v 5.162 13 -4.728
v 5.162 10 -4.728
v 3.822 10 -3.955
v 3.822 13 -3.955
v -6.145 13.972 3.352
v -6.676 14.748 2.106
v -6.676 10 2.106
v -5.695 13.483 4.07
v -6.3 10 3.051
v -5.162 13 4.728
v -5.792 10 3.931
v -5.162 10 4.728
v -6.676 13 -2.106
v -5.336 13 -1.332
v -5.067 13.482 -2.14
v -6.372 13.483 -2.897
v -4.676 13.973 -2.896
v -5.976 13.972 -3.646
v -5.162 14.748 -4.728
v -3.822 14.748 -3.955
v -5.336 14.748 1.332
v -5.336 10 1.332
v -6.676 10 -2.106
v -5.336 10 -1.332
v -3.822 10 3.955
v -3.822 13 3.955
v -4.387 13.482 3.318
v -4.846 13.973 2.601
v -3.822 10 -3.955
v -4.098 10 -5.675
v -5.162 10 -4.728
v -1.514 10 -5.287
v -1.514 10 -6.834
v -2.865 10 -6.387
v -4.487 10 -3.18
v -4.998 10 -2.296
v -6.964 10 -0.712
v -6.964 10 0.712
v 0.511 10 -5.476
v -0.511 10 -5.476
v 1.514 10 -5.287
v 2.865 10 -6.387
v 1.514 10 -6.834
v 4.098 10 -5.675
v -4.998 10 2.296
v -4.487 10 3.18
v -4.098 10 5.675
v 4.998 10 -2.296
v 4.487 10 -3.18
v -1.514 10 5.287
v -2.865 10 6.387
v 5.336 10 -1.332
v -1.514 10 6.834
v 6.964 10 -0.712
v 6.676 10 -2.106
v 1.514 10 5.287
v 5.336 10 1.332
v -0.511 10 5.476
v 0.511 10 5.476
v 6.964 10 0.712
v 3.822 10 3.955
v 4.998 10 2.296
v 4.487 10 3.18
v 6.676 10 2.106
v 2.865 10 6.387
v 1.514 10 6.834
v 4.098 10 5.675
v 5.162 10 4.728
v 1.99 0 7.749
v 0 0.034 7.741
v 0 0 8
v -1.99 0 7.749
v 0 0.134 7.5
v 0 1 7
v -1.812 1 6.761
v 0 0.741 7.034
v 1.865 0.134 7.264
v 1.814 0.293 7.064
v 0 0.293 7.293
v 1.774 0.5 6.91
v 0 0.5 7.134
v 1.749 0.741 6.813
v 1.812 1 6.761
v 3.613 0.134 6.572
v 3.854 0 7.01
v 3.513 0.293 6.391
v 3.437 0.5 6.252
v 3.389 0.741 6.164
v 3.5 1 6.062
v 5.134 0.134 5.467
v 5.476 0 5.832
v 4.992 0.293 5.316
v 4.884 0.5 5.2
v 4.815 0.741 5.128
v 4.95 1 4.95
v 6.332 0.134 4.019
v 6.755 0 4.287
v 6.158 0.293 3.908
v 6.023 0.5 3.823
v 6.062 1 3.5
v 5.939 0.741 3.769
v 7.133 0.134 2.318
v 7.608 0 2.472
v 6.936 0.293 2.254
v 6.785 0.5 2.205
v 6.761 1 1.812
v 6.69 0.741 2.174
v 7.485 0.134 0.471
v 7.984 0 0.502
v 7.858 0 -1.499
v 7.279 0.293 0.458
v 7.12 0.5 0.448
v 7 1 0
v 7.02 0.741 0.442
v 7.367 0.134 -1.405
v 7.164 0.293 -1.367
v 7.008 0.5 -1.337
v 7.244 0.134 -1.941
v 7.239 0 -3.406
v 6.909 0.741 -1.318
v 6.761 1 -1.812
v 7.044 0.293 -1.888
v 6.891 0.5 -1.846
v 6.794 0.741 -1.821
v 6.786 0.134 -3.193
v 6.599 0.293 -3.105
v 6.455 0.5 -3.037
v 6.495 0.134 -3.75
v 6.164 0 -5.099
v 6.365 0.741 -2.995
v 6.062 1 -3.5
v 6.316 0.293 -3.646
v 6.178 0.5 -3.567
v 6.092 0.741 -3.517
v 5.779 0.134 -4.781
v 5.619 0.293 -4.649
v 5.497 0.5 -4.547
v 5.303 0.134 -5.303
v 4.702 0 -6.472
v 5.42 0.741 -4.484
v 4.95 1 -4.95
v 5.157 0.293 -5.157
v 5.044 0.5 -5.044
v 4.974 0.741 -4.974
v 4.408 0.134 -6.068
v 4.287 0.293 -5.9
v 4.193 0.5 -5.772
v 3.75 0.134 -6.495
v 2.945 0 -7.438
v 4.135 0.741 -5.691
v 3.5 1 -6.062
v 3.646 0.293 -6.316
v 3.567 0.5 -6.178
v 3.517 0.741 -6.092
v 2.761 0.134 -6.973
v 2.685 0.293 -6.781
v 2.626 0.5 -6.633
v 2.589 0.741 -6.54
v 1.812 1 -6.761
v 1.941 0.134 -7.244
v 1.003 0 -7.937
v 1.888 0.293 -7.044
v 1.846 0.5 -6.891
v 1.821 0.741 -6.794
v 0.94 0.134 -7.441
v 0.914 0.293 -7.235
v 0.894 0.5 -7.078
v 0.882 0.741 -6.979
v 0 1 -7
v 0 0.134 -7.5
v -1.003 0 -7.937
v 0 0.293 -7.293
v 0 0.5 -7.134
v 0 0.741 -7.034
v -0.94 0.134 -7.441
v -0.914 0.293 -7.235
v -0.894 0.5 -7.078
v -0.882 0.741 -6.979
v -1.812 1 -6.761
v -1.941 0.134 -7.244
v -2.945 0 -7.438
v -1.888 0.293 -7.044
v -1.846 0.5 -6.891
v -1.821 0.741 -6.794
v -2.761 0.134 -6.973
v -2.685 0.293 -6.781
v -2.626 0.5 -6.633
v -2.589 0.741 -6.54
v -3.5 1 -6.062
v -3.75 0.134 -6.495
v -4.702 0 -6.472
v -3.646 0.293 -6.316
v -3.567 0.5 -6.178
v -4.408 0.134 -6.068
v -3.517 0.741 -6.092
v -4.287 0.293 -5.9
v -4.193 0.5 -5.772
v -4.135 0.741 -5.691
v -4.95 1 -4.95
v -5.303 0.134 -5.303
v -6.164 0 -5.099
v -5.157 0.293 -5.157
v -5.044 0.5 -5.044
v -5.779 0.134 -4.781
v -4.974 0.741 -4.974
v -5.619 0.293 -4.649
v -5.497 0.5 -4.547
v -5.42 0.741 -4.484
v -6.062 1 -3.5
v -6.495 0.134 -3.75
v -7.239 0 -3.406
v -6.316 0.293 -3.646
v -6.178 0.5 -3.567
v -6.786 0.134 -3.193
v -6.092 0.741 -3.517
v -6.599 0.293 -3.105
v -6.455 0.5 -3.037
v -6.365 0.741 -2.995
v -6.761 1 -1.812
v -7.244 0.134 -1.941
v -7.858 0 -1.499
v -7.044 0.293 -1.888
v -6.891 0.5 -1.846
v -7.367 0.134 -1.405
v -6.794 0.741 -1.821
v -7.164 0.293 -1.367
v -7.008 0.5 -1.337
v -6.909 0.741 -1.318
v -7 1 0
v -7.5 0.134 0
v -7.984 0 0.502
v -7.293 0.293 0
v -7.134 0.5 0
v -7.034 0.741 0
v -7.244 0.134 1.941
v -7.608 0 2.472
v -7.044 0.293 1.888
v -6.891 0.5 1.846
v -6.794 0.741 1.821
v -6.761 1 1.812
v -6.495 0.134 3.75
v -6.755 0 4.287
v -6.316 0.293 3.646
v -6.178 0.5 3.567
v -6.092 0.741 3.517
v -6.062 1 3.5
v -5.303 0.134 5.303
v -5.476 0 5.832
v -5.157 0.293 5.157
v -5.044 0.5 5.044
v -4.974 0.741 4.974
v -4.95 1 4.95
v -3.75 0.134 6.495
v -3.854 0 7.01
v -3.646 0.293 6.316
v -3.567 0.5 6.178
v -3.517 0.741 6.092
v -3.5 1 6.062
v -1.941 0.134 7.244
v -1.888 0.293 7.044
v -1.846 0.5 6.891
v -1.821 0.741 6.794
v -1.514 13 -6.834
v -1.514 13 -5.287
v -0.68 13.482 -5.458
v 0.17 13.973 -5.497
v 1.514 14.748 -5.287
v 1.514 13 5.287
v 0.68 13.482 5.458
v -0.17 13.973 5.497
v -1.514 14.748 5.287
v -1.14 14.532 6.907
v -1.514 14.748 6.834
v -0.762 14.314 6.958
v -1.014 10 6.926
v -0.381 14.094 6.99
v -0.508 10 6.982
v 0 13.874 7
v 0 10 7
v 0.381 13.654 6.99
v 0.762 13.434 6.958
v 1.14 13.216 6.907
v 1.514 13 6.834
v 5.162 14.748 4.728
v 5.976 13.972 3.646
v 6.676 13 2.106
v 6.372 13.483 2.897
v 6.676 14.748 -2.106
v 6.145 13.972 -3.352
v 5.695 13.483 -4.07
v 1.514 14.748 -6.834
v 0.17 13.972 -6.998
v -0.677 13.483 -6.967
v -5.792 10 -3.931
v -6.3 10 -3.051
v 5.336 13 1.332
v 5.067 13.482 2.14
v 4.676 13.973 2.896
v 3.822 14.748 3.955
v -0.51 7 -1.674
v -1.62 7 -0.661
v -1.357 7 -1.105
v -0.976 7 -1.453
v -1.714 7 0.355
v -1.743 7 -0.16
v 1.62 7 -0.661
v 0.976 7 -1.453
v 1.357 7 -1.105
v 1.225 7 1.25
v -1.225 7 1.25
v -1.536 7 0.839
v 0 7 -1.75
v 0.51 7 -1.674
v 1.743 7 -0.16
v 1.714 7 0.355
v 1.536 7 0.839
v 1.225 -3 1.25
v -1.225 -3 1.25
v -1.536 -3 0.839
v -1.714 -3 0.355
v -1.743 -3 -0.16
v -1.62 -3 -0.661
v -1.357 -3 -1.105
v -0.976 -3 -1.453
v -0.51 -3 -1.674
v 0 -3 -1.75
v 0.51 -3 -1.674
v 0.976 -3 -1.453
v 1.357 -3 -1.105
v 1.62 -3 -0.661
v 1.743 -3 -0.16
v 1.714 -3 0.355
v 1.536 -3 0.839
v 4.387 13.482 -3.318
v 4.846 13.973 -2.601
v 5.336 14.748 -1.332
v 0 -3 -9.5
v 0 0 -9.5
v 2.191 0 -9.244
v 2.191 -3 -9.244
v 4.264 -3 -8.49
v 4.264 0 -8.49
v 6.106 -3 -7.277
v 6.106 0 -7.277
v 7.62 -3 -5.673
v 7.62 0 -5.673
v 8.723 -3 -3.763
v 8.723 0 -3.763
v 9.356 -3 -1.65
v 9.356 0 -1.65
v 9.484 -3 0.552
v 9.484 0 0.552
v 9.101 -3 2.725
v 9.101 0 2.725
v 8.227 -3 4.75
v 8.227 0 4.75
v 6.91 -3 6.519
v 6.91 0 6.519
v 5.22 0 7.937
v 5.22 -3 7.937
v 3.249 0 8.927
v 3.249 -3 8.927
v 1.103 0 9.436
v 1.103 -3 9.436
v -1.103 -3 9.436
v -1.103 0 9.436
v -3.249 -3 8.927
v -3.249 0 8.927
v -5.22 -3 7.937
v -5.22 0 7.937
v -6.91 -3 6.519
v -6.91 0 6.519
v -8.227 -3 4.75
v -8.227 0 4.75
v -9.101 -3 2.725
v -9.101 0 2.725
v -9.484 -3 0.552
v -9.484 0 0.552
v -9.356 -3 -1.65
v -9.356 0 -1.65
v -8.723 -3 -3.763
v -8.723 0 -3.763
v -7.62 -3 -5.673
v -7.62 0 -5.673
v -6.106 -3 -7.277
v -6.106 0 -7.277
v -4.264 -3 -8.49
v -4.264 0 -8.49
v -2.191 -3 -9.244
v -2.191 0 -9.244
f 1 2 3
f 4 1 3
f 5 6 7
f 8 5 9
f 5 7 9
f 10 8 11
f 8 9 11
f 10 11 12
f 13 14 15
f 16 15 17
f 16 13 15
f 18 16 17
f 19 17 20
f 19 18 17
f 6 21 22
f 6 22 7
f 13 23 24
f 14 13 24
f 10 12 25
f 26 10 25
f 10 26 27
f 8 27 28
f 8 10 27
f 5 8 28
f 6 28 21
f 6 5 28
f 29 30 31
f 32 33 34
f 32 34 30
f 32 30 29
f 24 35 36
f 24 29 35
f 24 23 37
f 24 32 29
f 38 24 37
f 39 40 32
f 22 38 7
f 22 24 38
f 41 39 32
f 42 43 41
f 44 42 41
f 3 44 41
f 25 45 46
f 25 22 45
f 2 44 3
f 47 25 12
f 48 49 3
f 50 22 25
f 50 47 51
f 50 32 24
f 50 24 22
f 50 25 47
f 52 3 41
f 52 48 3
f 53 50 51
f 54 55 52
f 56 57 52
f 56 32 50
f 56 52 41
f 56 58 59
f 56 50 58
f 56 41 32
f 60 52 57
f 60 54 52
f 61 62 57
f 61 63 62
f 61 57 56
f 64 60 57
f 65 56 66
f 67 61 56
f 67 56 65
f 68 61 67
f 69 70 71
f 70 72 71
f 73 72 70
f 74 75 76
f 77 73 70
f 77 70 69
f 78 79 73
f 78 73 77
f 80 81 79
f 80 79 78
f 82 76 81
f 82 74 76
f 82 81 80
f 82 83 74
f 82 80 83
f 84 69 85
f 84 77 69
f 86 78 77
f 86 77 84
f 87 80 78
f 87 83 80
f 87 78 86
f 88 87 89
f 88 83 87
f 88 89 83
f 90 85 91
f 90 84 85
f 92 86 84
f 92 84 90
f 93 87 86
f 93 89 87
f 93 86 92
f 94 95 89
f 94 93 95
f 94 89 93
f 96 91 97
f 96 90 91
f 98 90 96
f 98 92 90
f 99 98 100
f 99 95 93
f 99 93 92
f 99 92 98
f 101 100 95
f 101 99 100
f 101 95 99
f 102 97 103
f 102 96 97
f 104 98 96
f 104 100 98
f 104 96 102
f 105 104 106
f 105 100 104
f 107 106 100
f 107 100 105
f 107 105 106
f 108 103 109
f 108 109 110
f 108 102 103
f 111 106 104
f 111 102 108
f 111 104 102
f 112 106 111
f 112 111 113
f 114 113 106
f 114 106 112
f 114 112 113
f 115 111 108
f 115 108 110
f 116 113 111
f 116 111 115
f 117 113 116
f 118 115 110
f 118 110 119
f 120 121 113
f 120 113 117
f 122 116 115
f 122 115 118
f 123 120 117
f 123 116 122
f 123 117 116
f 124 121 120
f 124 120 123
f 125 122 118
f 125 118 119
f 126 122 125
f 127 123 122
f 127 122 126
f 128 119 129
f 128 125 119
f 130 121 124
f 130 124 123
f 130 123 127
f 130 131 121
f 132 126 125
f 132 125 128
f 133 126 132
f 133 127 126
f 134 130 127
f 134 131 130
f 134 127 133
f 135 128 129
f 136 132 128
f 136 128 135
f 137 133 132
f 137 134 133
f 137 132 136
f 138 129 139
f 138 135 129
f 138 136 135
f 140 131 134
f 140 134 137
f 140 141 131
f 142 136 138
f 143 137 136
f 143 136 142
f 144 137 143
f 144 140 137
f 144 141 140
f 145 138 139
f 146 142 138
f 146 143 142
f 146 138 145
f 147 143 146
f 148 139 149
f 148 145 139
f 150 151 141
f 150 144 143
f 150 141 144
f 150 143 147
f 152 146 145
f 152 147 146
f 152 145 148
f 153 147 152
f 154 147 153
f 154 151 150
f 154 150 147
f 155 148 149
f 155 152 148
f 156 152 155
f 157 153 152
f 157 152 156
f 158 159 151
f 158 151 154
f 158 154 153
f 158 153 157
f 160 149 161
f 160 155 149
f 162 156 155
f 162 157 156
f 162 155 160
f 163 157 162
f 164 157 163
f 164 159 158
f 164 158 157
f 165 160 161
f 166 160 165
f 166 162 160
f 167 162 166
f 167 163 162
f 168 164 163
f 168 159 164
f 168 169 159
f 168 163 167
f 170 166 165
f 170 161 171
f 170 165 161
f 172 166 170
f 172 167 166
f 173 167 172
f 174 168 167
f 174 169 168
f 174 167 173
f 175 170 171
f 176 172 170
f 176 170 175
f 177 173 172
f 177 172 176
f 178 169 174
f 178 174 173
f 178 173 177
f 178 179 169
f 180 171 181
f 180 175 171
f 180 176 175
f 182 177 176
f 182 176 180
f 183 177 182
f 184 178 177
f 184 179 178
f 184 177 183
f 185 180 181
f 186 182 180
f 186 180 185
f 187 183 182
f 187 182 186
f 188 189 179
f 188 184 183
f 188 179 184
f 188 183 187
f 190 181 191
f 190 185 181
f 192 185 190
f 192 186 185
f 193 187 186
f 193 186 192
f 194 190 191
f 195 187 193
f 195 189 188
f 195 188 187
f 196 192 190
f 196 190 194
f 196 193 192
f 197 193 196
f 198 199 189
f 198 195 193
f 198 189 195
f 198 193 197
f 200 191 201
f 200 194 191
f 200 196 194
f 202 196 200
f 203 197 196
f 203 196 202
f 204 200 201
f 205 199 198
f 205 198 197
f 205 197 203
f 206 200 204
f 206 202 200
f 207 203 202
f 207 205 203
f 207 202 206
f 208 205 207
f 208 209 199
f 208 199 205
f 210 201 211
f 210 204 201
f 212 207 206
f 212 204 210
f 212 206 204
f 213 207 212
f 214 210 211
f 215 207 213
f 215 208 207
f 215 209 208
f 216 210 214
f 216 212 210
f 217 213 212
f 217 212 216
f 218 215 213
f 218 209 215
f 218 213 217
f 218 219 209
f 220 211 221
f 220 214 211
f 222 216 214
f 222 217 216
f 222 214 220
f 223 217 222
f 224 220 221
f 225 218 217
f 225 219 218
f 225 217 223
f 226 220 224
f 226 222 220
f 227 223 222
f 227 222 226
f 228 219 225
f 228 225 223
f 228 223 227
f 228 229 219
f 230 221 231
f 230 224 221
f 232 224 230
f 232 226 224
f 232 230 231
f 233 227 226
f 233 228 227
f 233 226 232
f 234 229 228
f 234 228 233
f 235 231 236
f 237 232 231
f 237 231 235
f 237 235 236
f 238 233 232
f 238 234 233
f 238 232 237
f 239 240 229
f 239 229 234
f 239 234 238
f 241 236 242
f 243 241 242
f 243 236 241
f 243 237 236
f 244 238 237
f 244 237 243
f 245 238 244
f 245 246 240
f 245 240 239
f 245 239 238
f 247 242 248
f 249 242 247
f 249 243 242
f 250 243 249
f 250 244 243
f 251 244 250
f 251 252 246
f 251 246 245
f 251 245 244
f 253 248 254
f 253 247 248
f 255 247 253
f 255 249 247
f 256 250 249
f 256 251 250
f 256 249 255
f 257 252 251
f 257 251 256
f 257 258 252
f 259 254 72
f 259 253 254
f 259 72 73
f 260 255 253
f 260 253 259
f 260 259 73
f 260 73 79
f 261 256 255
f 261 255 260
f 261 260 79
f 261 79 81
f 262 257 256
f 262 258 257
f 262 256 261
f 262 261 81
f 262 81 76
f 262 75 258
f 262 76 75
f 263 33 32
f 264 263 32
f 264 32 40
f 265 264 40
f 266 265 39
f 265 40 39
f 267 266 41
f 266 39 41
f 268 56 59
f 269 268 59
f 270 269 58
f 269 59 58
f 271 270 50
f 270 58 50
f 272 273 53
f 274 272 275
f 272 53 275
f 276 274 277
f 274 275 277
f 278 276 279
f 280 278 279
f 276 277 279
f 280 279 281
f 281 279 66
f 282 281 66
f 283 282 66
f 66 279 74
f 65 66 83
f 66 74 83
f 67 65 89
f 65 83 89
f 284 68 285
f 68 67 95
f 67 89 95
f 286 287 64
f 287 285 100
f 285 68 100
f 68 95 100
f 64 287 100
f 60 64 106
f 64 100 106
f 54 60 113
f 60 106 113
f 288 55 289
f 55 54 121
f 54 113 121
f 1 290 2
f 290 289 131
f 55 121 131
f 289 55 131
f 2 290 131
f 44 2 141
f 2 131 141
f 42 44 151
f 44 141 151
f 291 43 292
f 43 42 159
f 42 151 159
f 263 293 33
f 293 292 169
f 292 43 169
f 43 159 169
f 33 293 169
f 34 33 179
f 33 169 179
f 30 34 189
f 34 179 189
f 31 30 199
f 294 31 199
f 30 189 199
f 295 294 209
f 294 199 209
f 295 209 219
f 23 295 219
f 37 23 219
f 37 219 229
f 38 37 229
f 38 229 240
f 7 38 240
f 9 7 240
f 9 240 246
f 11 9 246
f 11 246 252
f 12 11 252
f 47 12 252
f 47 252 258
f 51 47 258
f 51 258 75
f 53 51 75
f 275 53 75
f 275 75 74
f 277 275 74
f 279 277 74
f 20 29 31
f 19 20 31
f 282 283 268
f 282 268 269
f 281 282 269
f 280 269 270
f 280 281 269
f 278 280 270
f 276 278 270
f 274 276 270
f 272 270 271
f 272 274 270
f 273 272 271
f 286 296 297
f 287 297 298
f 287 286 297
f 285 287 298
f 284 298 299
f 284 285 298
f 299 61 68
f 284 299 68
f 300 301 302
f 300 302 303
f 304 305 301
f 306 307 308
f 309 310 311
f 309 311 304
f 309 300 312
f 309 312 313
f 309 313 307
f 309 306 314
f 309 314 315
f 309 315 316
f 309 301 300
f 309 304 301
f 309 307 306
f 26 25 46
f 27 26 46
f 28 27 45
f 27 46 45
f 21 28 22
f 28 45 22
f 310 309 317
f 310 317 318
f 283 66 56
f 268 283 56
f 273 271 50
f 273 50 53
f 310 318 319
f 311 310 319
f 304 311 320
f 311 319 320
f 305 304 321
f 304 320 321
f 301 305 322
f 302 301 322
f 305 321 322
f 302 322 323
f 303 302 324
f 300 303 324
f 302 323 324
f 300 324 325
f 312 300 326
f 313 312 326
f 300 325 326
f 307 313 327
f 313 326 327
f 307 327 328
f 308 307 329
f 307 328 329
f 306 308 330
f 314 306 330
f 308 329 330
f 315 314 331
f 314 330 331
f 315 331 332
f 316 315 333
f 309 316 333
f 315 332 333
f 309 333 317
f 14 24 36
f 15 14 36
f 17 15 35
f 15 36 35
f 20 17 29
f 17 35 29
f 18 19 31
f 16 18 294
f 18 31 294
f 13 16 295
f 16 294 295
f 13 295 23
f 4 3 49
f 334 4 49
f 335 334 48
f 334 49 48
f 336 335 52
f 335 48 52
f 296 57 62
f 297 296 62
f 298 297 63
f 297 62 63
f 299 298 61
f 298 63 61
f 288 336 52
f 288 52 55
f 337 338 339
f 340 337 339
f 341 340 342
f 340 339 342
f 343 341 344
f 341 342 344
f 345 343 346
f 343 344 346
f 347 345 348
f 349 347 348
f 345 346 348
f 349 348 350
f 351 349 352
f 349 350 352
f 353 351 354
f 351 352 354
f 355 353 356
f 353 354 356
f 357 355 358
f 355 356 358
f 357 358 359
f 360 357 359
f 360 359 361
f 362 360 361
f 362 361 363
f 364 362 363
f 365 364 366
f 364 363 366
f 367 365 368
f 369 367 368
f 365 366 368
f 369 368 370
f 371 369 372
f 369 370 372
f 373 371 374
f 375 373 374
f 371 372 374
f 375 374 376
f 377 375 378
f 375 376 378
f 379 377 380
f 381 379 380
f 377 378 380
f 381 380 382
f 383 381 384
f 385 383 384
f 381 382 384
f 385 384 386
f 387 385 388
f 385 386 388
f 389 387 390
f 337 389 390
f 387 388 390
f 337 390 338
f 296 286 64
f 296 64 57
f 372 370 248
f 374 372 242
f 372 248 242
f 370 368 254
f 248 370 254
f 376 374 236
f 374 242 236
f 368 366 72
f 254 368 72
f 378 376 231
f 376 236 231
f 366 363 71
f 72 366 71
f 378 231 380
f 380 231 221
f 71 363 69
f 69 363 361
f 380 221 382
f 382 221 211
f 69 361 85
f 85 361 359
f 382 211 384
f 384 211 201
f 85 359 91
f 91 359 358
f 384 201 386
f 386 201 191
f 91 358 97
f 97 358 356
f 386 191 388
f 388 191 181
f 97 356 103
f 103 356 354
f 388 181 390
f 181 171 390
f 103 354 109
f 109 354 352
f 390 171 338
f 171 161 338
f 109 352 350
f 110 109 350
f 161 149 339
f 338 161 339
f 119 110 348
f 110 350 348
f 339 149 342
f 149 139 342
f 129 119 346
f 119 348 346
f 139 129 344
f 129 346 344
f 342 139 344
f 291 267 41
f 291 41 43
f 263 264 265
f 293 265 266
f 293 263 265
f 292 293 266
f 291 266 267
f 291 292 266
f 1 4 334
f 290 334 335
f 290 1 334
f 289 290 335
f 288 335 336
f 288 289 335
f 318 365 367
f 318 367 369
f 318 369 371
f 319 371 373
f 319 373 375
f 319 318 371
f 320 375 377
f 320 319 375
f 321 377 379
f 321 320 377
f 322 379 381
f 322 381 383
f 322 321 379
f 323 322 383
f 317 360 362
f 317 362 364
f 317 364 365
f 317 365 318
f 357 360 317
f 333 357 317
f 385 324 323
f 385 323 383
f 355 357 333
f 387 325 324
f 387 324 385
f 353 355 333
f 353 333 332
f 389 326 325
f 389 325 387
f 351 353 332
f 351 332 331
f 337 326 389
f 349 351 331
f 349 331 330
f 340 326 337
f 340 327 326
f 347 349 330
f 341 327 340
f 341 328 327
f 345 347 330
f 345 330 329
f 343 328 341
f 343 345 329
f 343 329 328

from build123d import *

# Parameters (mm, degrees)
SKETCH1_R           = 7
BOSS_EXTRUDE1_DEPTH = 10
BOSS_EXTRUDE3_DEPTH = 5
CHAMFER2_SIZE       = 2
CHAMFER2_SIZE_2     = 3.464101615
SKETCH7_R           = 9.5
BOSS_EXTRUDE4_DEPTH = 3
CUT_EXTRUDE1_DEPTH  = 10
FILLET1_R           = 1


with BuildPart() as part:
    # Sketch1 → Boss-Extrude1 (new body)
    with BuildSketch(Plane(origin=(0, 0, 0), x_dir=(1, 0, 0), z_dir=(0, 1, 0))):
        with Locations(Location((0, 0, 0), (0, 0, 270))):
            Circle(SKETCH1_R)
    extrude(amount=BOSS_EXTRUDE1_DEPTH)

    # Sketch5 → Boss-Extrude3 (add)
    with BuildSketch(Plane(origin=(0, 10, 0), x_dir=(1, 0, 0), z_dir=(0, 1, 0))):
        with BuildLine():
            Line((-3.821979409, 3.955056687), (-5.161555406, 4.72846125))
            ThreePointArc((-5.161555406, 4.72846125), (-6.062177826, 3.5), (-6.675745266, 2.10580748))
            Line((-6.675745266, 2.10580748), (-5.336169269, 1.332402917))
            ThreePointArc((-5.336169269, 1.332402917), (-4.763139721, 2.75), (-3.821979409, 3.955056687))
        make_face()
        with BuildLine():
            Line((1.51418986, 5.287459604), (1.51418986, 6.83426873))
            ThreePointArc((1.51418986, 6.83426873), (0, 7), (-1.51418986, 6.83426873))
            Line((-1.51418986, 6.83426873), (-1.51418986, 5.287459604))
            ThreePointArc((-1.51418986, 5.287459604), (0, 5.5), (1.51418986, 5.287459604))
        make_face()
        with BuildLine():
            ThreePointArc((6.675745266, 2.10580748), (6.062177826, 3.5), (5.161555406, 4.72846125))
            Line((5.161555406, 4.72846125), (3.821979409, 3.955056687))
            ThreePointArc((3.821979409, 3.955056687), (4.763139721, 2.75), (5.336169269, 1.332402917))
            Line((5.336169269, 1.332402917), (6.675745266, 2.10580748))
        make_face()
        with BuildLine():
            ThreePointArc((5.161555406, -4.72846125), (6.062177826, -3.5), (6.675745266, -2.10580748))
            Line((6.675745266, -2.10580748), (5.336169269, -1.332402917))
            ThreePointArc((5.336169269, -1.332402917), (4.763139721, -2.75), (3.821979409, -3.955056687))
            Line((3.821979409, -3.955056687), (5.161555406, -4.72846125))
        make_face()
        with BuildLine():
            ThreePointArc((-1.51418986, -6.83426873), (0, -7), (1.51418986, -6.83426873))
            Line((1.51418986, -6.83426873), (1.51418986, -5.287459604))
            ThreePointArc((1.51418986, -5.287459604), (0, -5.5), (-1.51418986, -5.287459604))
            Line((-1.51418986, -5.287459604), (-1.51418986, -6.83426873))
        make_face()
        with BuildLine():
            Line((-5.336169269, -1.332402917), (-6.675745266, -2.10580748))
            ThreePointArc((-6.675745266, -2.10580748), (-6.062177826, -3.5), (-5.161555406, -4.72846125))
            Line((-5.161555406, -4.72846125), (-3.821979409, -3.955056687))
            ThreePointArc((-3.821979409, -3.955056687), (-4.763139721, -2.75), (-5.336169269, -1.332402917))
        make_face()
    extrude(amount=BOSS_EXTRUDE3_DEPTH)

    # Chamfer2
    # the kernel refuses this chamfer: 3.464101615, 2 mm, written as the material it takes off along each edge
    with BuildSketch(Plane(origin=(-1.51418986, 15, -15.796196671), x_dir=(-0.05789386240267136, -0.9983227437537926, 0), z_dir=(0, 0, 1)), Plane(origin=(12.92281267, 15, -9.20942522), x_dir=(-0.02894693120133557, -0.9983227437537926, -0.05013755556391421), z_dir=(-0.8660254037844396, 0, 0.4999999999999985)), Plane(origin=(14.43700253, 15, 6.58677145), x_dir=(0.02894693120133555, -0.9983227437537926, -0.05013755556391386), z_dir=(-0.8660254037844383, 0, -0.5000000000000009)), Plane(origin=(1.51418986, 15, 15.796196671), x_dir=(0.05789386240267136, -0.9983227437537926, 0), z_dir=(0, 0, -1)), Plane(origin=(-12.92281267, 15, 9.20942522), x_dir=(0.028946931201335627, -0.9983227437537926, 0.05013755556391417), z_dir=(0.866025403784439, 0, -0.4999999999999995)), Plane(origin=(-14.43700253, 15, -6.58677145), x_dir=(-0.028946931201335666, -0.9983227437537926, 0.05013755556391416), z_dir=(0.8660254037844386, 0, 0.5000000000000002))) as chamfer2_piece_1:
        Polygon((CHAMFER2_SIZE * 0.998322743754, CHAMFER2_SIZE * 0.0578938624027), (-CHAMFER2_SIZE_2 * 0.057893862405, CHAMFER2_SIZE_2 * 0.998322743793), (0, 0), align=None)
    extrude(amount=19.470665008, mode=Mode.SUBTRACT)

    # Sketch7 → Boss-Extrude4 (add)
    with BuildSketch(Plane.XZ):
        with Locations(Location((0, 0, 0), (0, 0, 270))):
            Circle(SKETCH7_R)
    extrude(amount=BOSS_EXTRUDE4_DEPTH)

    # Sketch6 → Cut-Extrude1 (cut)
    with BuildSketch(Plane.XZ.offset(3)):
        with BuildLine():
            Line((1.224744871, 1.25), (-1.224744871, 1.25))
            ThreePointArc((-1.224744871, 1.25), (0, -1.75), (1.224744871, 1.25))
        make_face()
    extrude(amount=-CUT_EXTRUDE1_DEPTH, mode=Mode.SUBTRACT)

    # Fillet1
    fillet1_edges = [part.edges().sort_by_distance(p)[0] for p in [
        (0, 0, -7),
    ]]
    fillet(fillet1_edges, radius=FILLET1_R)


solid = part.part
